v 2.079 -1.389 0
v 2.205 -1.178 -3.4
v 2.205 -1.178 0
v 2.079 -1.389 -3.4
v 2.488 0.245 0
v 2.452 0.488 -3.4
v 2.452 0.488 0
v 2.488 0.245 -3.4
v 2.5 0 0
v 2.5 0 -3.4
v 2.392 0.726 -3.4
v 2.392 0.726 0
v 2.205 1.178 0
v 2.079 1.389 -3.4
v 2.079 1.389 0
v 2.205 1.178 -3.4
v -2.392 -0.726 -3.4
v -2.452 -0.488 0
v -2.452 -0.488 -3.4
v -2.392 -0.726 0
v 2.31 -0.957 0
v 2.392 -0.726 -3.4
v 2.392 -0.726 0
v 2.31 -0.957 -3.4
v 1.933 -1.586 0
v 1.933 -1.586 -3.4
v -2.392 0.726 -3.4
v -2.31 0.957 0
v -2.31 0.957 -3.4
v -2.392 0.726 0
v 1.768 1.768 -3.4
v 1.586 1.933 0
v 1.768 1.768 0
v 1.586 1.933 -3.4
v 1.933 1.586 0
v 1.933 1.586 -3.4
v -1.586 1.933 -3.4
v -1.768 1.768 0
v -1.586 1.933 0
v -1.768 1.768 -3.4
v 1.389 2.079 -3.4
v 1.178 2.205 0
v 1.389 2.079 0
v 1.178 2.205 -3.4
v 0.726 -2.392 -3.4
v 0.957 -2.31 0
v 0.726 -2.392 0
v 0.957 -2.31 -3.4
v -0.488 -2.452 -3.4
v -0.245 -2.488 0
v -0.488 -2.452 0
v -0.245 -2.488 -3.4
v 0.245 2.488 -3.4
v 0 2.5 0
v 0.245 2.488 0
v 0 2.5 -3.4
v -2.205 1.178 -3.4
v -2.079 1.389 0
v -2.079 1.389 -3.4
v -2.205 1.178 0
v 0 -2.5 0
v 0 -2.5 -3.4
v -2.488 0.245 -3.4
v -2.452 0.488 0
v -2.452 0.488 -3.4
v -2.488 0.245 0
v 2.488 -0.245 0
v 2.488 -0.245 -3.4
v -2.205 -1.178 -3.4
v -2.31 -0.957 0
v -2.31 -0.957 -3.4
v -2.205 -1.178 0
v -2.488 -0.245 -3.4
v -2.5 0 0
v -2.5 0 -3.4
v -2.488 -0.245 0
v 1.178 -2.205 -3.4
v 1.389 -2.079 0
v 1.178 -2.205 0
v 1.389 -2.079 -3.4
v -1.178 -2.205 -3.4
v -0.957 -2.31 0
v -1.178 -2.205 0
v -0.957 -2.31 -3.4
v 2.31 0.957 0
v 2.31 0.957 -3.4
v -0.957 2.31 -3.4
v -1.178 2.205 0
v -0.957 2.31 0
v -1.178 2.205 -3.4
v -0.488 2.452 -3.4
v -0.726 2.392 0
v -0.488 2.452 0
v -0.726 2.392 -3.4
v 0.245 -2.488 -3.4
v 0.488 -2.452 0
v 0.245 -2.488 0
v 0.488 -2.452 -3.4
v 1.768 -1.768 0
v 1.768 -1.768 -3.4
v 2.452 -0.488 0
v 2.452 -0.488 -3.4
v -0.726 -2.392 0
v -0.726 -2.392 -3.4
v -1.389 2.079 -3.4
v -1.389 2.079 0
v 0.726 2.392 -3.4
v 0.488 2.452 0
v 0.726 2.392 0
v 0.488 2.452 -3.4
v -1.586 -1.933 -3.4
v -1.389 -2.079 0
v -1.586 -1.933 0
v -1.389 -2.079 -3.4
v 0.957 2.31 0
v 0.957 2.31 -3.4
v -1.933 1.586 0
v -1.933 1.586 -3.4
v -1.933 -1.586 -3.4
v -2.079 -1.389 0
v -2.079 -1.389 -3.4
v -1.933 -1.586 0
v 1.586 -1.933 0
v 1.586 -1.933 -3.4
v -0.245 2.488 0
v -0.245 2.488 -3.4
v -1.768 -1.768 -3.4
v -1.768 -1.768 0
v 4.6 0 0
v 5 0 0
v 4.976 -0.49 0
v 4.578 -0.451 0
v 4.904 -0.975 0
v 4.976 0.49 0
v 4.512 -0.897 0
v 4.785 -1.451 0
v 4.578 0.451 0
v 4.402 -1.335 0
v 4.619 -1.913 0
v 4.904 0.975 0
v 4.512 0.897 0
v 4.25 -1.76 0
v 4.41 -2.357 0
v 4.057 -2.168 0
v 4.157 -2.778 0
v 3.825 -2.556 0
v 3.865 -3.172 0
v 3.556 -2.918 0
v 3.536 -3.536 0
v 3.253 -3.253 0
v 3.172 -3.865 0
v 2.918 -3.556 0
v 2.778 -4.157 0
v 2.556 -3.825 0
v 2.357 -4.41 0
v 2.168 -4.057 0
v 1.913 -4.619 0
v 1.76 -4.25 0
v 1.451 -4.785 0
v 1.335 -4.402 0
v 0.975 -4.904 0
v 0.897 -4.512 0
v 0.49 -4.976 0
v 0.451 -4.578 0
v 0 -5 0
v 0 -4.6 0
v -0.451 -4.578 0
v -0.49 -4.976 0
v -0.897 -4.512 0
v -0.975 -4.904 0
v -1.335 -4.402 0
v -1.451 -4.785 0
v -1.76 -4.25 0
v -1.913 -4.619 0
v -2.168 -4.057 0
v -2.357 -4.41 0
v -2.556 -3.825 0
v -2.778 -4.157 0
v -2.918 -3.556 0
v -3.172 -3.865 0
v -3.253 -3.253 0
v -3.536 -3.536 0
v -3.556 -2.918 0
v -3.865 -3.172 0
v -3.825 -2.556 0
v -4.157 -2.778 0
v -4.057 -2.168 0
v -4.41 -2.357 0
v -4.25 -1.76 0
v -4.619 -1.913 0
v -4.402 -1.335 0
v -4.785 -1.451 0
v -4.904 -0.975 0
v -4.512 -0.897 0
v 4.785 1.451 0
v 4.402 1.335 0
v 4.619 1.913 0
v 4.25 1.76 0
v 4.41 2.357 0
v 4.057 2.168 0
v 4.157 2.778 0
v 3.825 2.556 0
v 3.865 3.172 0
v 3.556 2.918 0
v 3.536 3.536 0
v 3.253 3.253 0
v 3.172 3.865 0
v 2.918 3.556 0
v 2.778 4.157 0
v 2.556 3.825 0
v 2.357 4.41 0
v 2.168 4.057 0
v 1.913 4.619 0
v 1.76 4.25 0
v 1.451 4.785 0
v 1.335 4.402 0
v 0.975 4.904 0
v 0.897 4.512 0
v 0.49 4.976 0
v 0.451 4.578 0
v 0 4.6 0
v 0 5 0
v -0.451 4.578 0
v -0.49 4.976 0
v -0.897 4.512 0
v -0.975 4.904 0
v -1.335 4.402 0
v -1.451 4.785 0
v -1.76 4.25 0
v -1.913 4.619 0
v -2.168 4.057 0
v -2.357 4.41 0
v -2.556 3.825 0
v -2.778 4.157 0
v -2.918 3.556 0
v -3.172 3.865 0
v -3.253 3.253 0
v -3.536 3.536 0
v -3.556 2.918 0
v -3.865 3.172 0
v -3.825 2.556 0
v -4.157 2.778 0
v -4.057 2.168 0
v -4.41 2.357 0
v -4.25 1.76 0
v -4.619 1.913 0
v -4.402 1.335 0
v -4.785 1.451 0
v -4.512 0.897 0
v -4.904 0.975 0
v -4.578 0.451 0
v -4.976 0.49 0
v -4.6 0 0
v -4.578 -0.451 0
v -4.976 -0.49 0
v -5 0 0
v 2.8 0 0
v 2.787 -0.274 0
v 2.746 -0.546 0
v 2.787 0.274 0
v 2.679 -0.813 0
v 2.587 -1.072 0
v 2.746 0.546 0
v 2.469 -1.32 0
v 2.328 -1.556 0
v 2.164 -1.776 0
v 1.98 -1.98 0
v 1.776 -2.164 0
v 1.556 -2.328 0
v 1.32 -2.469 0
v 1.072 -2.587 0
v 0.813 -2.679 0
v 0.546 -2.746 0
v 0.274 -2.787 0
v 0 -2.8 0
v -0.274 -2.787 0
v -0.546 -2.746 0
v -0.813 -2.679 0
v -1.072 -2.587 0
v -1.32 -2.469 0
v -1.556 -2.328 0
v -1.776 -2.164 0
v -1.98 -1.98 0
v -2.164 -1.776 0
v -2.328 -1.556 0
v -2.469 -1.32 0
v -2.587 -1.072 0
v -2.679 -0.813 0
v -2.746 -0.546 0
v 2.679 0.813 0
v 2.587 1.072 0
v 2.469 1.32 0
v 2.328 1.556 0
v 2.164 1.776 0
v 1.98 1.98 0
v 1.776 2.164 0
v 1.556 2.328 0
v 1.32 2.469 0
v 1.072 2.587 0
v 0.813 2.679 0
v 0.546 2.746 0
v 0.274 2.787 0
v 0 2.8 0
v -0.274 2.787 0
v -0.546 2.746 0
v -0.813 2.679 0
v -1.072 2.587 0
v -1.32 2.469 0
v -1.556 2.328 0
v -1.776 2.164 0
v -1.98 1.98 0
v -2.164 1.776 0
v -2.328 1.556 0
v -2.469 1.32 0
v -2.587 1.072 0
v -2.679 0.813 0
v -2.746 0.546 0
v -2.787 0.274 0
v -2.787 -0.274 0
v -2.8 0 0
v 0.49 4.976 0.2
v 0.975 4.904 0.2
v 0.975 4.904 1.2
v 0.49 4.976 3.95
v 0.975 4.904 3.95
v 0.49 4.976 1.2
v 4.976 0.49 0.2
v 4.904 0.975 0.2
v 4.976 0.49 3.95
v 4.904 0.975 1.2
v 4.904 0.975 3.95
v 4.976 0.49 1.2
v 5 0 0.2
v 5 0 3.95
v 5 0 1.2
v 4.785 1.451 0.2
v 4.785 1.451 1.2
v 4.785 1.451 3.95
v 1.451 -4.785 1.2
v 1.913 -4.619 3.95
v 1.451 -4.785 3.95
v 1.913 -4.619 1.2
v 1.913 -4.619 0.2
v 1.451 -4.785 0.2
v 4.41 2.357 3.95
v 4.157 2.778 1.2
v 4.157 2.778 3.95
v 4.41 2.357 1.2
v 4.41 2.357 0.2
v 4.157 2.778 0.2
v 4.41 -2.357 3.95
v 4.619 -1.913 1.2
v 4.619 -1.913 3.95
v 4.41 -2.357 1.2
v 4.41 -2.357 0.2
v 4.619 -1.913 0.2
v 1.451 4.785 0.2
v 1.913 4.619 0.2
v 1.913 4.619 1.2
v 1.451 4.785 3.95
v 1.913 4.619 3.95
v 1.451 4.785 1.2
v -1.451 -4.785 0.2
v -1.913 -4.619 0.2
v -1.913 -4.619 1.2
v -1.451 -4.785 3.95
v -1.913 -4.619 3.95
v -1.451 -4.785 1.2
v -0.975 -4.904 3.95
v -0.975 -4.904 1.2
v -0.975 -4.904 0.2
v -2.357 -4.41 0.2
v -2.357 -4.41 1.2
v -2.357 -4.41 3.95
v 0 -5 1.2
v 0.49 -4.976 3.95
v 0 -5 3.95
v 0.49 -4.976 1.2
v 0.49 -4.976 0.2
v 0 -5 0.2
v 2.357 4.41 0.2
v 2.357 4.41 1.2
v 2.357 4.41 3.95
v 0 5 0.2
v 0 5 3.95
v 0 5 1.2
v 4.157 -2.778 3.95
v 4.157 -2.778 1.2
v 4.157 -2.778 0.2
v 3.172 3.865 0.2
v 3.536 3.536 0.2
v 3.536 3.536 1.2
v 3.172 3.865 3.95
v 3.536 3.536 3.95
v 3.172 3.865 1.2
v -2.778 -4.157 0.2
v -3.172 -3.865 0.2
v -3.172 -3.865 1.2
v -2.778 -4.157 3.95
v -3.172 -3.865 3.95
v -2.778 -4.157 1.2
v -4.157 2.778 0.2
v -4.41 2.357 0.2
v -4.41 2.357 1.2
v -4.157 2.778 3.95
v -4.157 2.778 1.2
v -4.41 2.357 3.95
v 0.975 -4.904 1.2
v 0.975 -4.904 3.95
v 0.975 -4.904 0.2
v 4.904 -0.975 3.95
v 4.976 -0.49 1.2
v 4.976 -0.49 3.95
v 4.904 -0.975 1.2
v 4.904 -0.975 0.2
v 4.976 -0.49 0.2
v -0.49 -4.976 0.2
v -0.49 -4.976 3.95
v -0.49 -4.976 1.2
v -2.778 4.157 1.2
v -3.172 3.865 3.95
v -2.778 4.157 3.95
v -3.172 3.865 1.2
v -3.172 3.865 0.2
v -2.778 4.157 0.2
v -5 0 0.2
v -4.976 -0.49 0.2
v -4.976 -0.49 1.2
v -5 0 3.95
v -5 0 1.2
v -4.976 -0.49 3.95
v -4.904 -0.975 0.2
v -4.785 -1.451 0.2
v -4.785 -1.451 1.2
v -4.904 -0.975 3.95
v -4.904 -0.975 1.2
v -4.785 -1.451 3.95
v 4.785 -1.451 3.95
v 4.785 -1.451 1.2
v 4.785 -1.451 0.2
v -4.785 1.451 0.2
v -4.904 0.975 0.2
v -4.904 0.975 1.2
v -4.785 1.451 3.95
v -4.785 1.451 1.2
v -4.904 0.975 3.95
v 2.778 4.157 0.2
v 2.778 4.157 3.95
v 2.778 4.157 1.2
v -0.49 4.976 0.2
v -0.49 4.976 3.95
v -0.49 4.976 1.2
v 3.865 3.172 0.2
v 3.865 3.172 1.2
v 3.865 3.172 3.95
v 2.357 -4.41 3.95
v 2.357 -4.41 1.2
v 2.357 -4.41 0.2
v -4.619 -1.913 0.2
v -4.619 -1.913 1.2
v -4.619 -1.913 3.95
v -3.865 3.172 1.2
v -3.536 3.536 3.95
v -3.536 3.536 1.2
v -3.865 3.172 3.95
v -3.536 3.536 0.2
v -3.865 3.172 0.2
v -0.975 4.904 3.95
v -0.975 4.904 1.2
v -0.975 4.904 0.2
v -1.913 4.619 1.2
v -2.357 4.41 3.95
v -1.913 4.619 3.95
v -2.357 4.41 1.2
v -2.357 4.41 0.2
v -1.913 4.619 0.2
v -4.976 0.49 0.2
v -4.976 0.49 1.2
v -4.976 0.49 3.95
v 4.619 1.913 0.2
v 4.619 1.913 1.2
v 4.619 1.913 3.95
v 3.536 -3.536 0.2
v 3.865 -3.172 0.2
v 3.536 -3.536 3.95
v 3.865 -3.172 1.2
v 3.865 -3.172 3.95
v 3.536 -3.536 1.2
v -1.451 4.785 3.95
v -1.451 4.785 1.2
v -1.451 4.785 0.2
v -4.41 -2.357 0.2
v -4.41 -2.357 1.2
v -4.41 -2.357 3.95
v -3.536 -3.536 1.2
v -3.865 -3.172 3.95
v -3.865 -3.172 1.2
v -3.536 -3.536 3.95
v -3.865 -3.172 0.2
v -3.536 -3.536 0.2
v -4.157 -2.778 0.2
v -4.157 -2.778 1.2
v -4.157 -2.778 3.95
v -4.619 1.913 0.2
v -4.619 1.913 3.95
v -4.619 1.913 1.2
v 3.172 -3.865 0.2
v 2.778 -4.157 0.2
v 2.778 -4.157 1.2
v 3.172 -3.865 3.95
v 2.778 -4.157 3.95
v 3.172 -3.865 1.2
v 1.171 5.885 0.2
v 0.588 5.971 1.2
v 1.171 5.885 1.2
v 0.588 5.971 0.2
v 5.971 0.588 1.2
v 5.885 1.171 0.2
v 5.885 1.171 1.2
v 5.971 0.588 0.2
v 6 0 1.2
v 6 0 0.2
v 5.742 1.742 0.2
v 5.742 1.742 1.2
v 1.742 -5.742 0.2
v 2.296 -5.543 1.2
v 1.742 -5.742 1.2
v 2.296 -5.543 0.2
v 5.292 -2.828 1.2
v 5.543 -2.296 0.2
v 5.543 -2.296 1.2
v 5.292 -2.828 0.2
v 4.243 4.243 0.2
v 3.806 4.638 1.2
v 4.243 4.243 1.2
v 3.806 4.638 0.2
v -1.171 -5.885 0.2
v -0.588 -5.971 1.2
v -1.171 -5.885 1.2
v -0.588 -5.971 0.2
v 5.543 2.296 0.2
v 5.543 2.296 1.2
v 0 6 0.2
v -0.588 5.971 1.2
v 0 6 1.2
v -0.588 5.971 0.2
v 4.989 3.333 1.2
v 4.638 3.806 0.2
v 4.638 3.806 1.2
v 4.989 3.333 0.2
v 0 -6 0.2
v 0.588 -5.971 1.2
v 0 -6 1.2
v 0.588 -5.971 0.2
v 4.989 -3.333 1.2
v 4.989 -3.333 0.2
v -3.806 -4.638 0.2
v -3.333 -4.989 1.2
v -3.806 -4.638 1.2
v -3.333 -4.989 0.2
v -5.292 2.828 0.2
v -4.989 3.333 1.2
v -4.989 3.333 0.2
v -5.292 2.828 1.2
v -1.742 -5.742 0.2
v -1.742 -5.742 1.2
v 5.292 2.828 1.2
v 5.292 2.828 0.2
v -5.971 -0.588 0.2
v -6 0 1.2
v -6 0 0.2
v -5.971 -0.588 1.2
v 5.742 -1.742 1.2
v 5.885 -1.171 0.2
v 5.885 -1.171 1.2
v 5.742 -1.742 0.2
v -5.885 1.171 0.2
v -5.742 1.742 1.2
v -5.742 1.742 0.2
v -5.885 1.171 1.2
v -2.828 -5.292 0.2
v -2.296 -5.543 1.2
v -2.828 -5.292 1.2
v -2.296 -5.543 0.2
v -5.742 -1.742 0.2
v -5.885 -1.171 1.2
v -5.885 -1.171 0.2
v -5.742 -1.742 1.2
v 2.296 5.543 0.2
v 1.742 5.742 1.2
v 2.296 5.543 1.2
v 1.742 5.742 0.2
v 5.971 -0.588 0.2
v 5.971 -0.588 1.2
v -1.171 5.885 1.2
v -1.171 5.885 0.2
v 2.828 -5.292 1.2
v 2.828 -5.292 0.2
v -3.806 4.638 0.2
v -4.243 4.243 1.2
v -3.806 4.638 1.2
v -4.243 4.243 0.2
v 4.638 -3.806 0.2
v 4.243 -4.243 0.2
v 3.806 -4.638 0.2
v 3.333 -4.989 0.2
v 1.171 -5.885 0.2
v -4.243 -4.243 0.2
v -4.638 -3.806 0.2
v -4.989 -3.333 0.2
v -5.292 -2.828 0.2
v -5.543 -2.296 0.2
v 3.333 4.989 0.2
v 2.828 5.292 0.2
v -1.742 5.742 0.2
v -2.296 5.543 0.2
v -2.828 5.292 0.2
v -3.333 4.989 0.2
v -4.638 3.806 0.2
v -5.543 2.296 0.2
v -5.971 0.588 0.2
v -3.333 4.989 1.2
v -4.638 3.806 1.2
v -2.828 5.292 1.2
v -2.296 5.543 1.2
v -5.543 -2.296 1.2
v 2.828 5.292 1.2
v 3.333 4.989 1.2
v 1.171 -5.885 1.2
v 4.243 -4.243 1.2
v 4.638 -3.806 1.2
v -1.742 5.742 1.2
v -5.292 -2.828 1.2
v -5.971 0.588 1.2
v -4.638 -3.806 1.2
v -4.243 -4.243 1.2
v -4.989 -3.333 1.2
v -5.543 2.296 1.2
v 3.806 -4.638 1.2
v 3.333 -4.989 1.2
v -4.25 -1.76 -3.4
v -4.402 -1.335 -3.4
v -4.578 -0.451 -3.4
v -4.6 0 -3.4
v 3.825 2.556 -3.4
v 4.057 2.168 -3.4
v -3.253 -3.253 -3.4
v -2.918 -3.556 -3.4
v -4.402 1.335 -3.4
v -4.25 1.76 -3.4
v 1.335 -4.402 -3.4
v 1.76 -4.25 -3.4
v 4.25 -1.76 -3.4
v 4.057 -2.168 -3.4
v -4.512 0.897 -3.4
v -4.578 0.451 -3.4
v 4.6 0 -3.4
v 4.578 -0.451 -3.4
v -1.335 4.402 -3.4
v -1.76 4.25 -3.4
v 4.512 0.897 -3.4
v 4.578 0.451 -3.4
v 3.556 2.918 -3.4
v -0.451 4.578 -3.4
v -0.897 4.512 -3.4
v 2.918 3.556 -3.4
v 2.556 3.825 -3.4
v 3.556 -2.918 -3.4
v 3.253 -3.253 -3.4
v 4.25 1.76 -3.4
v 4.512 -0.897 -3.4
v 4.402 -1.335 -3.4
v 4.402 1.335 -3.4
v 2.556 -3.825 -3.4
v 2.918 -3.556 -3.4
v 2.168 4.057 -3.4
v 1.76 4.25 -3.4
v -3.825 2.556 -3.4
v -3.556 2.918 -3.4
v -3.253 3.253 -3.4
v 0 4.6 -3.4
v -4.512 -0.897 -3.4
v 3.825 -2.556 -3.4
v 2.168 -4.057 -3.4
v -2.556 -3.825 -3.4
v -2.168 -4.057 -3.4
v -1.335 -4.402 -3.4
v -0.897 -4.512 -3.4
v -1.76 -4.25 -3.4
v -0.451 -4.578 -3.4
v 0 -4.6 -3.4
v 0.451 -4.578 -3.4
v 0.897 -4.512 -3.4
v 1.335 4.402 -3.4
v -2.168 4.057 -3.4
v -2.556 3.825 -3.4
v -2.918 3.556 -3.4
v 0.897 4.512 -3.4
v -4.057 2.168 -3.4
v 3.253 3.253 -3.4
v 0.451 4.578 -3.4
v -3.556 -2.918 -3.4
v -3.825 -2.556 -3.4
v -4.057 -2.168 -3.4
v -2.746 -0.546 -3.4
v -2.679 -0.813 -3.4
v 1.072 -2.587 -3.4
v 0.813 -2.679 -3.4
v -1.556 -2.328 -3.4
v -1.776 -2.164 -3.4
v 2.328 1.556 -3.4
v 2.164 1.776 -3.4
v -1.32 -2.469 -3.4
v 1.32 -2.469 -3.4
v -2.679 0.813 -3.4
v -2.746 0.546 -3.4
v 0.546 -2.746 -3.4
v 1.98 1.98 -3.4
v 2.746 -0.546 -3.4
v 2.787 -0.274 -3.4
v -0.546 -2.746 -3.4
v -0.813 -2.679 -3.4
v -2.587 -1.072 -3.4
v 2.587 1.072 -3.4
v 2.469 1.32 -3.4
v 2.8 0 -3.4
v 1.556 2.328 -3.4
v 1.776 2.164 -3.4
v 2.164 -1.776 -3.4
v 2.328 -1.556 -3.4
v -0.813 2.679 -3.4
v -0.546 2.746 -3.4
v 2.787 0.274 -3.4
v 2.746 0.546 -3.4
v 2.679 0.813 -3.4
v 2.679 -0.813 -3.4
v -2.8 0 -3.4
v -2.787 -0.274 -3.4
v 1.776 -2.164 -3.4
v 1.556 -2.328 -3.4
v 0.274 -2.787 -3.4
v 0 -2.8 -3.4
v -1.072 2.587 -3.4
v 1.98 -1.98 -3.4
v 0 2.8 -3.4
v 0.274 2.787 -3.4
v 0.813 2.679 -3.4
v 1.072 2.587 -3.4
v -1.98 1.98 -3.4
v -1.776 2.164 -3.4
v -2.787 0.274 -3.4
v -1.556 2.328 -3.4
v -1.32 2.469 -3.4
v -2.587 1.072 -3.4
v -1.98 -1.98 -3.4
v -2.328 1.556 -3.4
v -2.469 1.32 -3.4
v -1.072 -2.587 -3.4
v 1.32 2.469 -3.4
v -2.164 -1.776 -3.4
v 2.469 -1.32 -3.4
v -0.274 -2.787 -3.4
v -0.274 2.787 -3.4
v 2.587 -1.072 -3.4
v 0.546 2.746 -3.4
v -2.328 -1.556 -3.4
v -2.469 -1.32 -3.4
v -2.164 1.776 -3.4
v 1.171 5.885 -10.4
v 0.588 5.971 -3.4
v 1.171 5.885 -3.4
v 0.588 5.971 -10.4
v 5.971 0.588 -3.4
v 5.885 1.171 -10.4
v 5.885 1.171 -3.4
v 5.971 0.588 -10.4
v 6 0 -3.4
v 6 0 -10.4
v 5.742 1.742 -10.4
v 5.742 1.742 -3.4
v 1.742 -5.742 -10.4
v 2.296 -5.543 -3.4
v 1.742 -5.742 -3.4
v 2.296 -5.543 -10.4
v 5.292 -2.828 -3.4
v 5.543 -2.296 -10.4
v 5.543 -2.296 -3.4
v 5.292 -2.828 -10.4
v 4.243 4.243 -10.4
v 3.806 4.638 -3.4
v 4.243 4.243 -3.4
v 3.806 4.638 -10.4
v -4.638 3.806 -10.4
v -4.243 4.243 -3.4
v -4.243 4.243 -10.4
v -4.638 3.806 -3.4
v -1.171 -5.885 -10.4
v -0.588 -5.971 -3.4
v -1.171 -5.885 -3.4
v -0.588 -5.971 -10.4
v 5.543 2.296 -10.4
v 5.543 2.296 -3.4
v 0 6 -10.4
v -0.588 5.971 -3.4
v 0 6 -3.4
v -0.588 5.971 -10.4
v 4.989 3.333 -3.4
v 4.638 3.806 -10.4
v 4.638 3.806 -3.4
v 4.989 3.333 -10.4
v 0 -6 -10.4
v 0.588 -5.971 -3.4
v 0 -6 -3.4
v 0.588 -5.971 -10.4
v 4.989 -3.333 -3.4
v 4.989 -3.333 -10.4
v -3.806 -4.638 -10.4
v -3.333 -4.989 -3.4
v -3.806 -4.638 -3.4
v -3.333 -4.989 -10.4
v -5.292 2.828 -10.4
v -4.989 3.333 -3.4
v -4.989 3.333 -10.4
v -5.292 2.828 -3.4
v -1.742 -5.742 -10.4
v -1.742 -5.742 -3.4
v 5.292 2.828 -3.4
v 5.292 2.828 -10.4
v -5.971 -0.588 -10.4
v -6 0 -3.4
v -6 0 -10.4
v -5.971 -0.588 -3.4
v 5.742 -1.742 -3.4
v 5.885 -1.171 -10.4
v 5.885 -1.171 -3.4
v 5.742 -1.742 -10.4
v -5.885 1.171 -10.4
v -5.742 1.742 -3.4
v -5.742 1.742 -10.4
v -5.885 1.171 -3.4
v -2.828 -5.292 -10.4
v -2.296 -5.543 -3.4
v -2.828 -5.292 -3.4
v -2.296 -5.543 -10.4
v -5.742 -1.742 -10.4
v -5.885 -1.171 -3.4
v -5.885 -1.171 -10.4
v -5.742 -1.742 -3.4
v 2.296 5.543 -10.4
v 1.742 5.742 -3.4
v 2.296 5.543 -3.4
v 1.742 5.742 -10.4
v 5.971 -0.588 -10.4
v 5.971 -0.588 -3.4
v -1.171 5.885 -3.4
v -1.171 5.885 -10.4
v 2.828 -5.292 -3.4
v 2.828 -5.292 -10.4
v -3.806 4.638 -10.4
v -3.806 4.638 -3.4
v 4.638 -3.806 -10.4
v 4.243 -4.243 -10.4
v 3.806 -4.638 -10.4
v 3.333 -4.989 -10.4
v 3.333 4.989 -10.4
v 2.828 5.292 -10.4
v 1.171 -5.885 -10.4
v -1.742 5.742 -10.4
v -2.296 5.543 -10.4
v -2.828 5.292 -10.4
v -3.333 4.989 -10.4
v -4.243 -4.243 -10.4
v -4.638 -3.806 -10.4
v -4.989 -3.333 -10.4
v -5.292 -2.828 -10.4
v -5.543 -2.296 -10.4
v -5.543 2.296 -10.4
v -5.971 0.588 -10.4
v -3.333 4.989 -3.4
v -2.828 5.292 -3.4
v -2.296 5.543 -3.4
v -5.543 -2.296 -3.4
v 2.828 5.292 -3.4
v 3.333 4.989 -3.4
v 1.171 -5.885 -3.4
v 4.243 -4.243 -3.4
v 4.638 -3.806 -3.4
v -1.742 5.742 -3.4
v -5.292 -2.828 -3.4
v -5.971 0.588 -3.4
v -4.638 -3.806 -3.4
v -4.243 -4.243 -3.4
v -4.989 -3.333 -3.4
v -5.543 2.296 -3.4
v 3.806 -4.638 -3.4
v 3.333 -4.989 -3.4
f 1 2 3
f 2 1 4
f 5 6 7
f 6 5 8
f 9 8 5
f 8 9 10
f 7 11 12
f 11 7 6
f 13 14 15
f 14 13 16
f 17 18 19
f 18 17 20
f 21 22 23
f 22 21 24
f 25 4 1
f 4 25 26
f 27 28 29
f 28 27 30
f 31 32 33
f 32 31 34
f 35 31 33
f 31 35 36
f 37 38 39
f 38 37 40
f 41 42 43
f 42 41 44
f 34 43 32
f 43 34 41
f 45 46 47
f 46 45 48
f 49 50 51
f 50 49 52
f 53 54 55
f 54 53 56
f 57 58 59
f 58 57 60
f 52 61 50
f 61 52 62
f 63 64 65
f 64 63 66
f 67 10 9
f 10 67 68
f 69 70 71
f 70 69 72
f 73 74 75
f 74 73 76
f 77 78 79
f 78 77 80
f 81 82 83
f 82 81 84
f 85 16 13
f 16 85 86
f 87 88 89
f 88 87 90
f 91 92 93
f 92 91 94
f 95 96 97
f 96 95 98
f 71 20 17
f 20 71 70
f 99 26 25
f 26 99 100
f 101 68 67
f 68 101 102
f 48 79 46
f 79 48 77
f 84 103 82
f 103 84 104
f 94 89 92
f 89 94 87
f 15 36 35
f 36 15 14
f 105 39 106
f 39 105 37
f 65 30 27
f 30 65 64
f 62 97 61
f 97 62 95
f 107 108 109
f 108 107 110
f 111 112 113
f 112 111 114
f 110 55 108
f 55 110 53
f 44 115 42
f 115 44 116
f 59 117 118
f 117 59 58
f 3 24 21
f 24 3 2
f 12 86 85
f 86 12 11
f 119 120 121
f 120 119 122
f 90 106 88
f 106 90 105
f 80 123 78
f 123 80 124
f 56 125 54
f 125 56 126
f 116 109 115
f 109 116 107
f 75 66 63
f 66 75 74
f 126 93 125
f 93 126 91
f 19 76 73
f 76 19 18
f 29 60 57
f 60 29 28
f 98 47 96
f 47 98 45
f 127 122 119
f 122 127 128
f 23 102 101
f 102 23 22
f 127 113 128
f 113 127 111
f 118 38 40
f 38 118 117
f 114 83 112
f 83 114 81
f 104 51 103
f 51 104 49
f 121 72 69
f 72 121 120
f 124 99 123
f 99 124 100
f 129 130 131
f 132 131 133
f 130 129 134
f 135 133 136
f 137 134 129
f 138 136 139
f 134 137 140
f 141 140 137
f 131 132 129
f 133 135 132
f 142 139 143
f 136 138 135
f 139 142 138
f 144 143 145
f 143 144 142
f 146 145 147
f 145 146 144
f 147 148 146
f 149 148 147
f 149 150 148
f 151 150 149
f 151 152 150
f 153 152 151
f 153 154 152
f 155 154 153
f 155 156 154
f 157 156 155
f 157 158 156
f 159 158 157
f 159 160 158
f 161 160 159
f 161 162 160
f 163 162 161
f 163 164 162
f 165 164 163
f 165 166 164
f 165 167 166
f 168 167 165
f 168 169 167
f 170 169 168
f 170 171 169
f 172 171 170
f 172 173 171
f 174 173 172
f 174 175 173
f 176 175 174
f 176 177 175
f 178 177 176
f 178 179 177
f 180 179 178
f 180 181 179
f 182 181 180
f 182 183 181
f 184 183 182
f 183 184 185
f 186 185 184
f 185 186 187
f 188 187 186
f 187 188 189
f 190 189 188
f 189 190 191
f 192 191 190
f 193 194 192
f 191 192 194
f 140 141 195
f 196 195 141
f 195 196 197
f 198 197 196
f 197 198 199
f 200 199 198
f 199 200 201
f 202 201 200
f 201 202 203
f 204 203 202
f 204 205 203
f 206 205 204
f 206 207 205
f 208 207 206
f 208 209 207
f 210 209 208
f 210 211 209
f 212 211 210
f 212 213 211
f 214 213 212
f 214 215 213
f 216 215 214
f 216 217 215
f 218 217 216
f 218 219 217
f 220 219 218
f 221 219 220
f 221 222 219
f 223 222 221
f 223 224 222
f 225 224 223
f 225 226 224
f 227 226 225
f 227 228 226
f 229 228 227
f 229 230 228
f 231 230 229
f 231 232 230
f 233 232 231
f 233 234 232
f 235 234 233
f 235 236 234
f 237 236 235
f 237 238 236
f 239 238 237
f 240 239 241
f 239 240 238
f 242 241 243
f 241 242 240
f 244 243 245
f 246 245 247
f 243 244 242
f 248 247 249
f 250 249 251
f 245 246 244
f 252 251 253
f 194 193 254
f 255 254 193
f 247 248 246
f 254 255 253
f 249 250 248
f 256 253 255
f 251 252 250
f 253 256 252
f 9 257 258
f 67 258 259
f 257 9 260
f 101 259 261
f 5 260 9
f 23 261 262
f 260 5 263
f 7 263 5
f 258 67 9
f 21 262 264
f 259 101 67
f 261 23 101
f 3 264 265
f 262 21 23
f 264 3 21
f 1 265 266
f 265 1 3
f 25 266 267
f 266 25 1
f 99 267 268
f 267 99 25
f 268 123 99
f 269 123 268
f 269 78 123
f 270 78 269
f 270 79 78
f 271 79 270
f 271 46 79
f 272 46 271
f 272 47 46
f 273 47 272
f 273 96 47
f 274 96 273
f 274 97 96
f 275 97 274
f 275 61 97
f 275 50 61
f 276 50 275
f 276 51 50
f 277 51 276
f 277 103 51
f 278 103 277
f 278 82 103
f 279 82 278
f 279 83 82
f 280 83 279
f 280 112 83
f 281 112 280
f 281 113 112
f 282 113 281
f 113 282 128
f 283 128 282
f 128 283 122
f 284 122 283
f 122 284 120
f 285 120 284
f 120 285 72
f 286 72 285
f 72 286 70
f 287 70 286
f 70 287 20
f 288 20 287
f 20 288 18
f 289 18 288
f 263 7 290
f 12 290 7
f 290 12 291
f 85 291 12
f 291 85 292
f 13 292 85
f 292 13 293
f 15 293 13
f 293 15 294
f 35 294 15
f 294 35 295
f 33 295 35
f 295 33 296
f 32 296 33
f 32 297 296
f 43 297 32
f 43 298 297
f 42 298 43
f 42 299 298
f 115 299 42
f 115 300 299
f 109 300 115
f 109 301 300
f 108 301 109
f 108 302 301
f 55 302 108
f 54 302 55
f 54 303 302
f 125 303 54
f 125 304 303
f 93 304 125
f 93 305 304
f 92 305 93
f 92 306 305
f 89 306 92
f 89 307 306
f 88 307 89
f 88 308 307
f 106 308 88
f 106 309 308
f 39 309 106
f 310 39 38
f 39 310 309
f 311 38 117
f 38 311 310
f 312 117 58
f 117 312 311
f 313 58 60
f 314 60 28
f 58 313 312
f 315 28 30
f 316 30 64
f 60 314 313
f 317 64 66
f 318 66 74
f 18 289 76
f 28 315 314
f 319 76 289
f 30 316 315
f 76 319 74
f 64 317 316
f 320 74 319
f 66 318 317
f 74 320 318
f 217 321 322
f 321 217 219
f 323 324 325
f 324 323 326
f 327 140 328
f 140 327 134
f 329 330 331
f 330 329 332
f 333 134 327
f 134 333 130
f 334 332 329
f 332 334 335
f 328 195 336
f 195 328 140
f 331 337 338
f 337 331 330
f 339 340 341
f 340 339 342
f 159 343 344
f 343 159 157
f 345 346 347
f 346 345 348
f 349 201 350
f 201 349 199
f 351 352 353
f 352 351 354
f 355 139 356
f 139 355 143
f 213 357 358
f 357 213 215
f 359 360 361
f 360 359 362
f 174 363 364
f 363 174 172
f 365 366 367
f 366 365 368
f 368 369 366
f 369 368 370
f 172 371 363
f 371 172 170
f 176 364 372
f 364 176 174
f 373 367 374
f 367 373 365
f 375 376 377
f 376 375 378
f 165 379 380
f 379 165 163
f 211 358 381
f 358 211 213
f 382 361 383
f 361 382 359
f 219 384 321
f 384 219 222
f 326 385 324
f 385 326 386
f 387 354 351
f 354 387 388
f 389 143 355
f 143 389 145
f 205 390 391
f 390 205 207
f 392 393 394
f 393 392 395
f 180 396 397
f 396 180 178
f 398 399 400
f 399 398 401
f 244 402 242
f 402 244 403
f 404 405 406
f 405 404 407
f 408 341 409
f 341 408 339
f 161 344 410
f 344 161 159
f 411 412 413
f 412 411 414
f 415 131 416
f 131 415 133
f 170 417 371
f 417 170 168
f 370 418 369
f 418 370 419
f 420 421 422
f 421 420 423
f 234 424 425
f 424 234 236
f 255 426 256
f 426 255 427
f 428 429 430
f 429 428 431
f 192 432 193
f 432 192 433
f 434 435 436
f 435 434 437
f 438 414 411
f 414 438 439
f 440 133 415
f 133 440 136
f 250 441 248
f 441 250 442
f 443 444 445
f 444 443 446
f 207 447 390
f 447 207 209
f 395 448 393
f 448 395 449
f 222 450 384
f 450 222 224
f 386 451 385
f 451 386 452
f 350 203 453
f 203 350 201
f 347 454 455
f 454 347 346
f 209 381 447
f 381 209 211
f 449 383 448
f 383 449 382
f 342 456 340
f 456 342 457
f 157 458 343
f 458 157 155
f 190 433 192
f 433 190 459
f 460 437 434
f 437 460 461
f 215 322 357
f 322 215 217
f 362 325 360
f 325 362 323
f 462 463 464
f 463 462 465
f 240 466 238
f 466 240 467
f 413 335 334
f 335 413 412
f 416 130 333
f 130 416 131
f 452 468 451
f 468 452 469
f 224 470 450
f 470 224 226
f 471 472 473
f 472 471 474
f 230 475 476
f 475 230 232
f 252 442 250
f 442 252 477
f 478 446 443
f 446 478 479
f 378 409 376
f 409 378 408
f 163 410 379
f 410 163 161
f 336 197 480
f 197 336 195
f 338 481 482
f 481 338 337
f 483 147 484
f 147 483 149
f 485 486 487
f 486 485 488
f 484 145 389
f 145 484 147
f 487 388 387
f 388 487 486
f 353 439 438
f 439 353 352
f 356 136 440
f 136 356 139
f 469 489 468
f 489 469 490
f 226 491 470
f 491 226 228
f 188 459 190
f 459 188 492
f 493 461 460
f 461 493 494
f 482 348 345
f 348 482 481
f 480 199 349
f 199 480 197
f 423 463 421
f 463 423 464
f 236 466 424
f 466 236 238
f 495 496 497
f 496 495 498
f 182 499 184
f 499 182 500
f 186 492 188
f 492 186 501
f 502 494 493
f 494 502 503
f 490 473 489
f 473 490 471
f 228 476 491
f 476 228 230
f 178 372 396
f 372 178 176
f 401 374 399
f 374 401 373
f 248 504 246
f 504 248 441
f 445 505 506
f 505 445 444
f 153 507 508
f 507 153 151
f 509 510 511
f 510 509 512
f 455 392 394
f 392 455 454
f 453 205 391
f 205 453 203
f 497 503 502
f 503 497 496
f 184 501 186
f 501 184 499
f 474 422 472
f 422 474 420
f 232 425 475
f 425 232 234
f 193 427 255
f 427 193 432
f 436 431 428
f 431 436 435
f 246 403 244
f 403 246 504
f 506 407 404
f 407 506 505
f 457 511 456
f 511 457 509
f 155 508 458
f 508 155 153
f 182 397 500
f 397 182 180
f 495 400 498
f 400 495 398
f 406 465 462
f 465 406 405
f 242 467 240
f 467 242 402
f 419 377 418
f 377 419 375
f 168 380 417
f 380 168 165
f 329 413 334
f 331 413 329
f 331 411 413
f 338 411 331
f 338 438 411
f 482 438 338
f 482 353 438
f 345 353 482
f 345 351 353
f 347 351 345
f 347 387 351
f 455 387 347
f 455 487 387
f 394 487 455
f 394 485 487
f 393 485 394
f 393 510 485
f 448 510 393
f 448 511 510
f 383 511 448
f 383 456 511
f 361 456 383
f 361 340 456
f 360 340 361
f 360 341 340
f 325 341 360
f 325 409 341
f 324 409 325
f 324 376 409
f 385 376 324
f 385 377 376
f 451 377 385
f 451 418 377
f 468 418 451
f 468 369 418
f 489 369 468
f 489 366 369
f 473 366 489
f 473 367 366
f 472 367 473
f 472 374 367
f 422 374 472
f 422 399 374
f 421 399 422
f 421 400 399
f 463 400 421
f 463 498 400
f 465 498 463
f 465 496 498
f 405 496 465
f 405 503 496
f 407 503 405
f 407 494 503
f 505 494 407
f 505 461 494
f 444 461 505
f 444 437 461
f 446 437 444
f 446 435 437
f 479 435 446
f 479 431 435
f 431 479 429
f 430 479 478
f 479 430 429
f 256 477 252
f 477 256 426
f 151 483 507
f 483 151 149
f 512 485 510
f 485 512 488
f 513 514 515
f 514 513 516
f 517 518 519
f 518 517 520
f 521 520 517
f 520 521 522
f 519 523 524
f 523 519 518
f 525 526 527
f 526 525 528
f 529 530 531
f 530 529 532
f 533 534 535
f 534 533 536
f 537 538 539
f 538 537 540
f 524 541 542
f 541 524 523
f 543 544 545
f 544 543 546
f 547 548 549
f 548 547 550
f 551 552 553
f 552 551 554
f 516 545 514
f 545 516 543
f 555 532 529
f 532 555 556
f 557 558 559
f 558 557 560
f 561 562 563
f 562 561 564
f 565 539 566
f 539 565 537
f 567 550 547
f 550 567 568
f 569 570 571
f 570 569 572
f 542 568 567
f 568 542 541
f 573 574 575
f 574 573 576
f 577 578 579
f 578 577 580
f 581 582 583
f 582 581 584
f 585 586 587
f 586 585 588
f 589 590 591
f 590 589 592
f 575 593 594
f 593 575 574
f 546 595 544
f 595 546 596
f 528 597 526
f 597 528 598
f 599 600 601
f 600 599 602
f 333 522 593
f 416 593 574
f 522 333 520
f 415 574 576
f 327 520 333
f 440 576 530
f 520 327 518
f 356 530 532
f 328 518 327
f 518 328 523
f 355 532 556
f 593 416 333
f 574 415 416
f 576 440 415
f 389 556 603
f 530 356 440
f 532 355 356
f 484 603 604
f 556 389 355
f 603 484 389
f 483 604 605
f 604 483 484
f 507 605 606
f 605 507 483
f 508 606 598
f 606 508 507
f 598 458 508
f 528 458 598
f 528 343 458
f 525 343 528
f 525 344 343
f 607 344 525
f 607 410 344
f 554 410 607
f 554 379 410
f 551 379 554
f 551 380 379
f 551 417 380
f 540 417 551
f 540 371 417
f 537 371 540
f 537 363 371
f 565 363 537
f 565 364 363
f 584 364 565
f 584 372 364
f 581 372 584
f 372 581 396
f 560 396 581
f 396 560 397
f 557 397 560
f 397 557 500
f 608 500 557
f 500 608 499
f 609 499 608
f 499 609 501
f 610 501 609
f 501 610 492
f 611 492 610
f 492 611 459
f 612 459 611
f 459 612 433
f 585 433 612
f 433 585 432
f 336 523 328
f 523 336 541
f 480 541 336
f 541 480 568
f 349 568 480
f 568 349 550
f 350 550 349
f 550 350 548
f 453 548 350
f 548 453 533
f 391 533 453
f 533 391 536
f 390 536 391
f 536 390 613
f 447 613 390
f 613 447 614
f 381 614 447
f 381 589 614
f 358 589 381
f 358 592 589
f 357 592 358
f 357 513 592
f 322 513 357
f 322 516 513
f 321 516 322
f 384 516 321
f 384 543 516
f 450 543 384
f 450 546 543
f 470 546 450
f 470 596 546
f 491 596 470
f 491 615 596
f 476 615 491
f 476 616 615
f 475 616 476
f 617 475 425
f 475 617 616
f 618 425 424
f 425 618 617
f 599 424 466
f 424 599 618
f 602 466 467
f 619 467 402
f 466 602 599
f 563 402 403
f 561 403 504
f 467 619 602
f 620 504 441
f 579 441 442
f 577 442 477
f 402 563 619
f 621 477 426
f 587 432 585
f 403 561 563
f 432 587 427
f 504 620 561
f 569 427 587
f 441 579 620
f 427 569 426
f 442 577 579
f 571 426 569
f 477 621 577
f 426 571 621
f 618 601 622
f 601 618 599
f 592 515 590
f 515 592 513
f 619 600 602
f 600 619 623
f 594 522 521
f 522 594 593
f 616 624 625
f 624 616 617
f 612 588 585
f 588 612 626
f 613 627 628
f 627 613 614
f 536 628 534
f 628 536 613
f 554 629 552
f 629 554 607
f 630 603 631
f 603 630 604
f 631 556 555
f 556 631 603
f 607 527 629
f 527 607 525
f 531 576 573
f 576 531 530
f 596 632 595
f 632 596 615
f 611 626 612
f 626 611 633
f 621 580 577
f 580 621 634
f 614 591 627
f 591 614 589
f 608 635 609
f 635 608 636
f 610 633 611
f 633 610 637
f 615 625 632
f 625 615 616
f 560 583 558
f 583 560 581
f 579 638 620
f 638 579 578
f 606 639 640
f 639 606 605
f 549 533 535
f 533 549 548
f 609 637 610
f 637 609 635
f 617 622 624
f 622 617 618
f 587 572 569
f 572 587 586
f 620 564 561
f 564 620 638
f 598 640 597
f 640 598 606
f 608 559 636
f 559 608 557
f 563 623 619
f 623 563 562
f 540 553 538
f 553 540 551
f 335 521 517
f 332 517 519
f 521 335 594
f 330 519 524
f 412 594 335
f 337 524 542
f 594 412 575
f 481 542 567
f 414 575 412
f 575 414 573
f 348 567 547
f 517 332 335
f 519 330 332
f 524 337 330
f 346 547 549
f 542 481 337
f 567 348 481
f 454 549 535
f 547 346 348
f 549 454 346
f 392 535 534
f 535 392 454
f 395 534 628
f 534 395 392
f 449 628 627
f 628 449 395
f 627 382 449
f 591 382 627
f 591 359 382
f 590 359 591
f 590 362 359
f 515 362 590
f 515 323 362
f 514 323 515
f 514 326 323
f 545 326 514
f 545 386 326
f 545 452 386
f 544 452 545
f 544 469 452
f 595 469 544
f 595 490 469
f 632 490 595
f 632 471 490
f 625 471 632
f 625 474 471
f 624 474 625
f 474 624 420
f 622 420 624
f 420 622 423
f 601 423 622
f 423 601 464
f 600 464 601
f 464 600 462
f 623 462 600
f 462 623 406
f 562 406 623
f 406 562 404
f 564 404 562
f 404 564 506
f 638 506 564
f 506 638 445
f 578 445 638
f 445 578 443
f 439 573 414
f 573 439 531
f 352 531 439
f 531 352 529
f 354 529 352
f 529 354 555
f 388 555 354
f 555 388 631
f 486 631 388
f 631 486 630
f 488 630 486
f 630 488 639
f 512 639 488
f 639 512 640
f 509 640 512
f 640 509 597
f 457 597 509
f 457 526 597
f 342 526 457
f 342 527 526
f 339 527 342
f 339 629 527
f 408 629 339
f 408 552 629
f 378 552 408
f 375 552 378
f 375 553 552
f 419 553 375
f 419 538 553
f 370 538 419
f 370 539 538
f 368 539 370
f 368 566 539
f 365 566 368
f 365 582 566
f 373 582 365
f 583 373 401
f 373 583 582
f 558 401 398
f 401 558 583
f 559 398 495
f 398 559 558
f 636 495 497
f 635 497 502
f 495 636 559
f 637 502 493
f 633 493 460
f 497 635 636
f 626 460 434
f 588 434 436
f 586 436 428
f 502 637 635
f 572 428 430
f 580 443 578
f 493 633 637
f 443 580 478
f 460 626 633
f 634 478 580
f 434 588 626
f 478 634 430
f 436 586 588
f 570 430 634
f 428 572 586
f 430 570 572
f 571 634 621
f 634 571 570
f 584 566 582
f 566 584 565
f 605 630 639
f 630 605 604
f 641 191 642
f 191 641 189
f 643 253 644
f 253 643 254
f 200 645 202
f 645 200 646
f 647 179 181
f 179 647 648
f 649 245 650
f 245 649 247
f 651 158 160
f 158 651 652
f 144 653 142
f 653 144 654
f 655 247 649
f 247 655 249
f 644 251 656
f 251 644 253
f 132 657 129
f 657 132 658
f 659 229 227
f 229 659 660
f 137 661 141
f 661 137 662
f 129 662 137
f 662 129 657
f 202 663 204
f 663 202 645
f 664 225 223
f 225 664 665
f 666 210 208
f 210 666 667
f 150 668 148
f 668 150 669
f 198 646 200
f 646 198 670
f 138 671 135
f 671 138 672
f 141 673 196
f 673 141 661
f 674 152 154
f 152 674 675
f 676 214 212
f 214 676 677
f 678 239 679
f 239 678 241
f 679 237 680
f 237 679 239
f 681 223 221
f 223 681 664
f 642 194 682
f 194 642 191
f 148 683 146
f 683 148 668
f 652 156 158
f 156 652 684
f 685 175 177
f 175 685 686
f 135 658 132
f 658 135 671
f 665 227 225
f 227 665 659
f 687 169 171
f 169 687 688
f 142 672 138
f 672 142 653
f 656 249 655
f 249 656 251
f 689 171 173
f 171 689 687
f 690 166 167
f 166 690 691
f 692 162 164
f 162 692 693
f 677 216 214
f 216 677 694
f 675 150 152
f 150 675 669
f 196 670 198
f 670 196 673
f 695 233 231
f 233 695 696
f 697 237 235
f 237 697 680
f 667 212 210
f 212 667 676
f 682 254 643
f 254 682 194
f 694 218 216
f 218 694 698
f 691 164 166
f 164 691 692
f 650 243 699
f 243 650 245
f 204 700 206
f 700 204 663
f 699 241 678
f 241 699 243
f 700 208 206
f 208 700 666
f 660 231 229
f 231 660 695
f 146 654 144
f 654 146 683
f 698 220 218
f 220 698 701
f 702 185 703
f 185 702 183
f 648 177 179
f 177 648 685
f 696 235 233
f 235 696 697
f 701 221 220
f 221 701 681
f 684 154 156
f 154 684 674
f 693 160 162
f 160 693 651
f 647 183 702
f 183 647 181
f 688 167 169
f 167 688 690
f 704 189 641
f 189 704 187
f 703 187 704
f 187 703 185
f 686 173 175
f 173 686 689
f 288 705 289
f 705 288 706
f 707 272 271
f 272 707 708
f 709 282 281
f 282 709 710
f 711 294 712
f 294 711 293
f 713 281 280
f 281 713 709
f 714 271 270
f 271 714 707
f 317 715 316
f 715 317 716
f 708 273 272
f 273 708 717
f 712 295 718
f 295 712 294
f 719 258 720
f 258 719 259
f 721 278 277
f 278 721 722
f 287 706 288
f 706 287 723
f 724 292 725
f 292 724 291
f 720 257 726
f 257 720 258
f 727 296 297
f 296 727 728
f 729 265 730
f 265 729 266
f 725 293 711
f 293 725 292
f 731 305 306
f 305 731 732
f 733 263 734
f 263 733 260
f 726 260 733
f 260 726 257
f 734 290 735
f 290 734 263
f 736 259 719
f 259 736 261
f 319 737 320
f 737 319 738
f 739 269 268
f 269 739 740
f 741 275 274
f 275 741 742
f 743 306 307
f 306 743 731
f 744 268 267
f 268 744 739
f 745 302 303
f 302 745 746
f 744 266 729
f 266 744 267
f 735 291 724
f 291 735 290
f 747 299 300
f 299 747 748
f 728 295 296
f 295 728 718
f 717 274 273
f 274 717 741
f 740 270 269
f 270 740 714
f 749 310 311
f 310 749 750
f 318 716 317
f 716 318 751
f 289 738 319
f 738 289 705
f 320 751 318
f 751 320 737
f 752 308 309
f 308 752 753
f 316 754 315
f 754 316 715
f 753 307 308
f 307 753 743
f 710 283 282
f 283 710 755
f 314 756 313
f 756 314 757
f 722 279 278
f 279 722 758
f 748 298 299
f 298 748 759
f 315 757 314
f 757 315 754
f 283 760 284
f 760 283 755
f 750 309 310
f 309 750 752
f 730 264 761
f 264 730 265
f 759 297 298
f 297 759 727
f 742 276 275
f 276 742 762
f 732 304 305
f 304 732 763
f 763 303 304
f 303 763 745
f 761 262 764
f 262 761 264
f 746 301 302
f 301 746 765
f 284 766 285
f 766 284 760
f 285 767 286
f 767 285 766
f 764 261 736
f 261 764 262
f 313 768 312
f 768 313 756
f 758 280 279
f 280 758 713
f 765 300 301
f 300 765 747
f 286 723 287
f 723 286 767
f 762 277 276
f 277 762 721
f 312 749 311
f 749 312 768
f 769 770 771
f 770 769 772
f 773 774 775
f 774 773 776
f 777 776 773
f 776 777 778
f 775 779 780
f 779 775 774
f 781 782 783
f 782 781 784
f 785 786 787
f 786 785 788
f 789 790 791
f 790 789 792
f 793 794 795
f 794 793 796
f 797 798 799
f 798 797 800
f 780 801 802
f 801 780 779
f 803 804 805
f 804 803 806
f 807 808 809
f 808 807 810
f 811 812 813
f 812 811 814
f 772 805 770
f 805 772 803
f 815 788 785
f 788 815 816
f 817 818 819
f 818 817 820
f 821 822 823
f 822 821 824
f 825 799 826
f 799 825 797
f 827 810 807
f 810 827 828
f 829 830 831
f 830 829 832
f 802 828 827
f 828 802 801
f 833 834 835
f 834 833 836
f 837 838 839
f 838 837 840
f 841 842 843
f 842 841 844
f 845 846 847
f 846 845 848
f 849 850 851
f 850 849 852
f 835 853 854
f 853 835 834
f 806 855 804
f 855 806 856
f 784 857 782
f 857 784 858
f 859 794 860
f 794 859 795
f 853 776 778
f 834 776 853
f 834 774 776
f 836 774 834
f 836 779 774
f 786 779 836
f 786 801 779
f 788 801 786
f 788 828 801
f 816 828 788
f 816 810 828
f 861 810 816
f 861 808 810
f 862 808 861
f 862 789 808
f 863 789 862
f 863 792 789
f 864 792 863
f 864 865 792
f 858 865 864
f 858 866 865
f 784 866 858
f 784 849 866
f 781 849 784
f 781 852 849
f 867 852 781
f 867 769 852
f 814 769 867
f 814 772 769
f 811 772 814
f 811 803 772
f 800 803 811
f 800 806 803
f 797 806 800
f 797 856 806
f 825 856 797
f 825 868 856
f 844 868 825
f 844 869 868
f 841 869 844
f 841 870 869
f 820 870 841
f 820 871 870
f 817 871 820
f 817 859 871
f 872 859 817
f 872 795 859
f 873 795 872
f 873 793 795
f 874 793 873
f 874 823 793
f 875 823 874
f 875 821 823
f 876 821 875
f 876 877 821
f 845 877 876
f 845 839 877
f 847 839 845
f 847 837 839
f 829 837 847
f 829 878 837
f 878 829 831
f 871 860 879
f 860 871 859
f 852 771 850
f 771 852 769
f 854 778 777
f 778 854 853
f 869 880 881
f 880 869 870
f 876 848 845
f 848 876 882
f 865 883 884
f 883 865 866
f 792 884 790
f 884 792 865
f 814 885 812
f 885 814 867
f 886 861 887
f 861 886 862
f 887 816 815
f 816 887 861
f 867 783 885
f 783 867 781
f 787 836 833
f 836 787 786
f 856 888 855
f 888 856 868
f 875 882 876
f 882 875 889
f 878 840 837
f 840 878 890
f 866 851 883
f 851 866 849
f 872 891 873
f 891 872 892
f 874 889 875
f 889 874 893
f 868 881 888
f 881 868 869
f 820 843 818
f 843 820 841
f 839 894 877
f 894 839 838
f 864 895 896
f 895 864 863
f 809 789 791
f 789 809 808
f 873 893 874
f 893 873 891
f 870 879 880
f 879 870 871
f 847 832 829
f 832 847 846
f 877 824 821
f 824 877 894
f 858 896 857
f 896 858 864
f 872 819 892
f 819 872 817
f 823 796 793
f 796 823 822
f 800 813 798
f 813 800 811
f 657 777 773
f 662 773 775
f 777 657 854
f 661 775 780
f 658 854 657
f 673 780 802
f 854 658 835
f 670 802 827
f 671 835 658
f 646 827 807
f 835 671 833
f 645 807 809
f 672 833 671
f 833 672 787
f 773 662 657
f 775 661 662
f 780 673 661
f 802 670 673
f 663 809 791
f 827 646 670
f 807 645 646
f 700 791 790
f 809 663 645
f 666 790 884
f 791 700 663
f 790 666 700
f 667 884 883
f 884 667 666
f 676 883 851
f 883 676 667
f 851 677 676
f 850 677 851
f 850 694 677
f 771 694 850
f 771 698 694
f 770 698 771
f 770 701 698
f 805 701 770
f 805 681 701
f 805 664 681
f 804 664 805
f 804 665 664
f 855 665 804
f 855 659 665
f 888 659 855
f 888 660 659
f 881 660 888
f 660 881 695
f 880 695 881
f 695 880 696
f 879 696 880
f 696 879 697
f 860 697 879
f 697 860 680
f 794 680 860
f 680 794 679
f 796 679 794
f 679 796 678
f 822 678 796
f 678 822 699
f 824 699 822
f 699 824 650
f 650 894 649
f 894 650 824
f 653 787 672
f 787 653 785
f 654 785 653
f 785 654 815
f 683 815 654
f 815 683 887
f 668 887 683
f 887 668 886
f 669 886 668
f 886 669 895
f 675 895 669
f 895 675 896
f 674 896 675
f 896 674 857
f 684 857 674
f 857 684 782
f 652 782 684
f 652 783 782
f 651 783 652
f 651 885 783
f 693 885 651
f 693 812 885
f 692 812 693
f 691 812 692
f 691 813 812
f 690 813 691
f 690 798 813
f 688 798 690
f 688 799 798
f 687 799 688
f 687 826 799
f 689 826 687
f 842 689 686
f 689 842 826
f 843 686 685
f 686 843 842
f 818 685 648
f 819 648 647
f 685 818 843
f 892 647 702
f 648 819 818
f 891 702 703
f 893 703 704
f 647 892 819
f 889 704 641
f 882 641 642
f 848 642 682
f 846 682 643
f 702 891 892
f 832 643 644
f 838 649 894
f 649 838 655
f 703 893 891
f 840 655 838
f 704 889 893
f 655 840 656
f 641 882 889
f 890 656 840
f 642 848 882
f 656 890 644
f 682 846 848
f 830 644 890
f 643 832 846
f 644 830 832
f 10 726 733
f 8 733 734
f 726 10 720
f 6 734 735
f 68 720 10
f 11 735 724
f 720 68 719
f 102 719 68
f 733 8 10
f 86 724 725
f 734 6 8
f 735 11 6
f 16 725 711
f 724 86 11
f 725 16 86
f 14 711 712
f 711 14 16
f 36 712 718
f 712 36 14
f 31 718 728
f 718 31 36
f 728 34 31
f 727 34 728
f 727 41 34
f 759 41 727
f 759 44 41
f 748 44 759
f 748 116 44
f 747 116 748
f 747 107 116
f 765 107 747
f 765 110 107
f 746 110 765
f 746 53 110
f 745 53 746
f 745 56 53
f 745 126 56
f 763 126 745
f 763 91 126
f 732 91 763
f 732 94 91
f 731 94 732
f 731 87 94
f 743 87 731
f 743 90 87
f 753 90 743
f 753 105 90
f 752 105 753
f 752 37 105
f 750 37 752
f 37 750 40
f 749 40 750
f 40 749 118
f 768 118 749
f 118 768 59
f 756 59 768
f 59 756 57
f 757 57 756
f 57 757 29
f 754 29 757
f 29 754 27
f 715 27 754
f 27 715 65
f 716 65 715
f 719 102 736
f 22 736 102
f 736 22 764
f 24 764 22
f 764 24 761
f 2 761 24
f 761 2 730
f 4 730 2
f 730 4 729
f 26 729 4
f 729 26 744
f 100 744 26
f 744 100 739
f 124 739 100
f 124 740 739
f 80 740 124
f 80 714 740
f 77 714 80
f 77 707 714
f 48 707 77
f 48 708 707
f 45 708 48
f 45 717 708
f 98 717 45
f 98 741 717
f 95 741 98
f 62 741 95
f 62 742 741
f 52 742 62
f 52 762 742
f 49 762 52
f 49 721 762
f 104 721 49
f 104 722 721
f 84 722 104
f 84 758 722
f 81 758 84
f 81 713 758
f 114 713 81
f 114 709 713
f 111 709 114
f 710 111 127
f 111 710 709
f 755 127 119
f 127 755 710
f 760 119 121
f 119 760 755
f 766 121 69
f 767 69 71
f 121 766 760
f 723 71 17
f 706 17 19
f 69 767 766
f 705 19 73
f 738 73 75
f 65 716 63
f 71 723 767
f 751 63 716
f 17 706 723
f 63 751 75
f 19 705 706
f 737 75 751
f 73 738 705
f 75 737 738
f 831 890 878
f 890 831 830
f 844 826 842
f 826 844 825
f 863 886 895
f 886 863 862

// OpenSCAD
// Parameters
shaft_diameter = 5; //[2.5:10:0.1]
length_under_head = 10; //[5:20:0.1]
head_diameter = 10; //[5:20:0.1]
head_height = 3.95; //[2:8:0.05]
thread_depth = 0.35; //[0.15:0.8:0.05]
thread_pitch = 0.8; //[0.4:1.6:0.05]
thread_turns = 13; //[5:30:1]
drive_socket_radius = 3; //[1.5:5:0.1]
drive_socket_depth = 2; //[1:3.5:0.1]
drive_slot_width = 1; //[0.6:2:0.05]
washer_outer_diameter = 12; //[8:24:0.1]
washer_thickness = 1; //[0.5:3:0.1]
washer_hole_diameter = 5.5; //[5.1:7:0.1]
spacer_height = 6; //[3:15:0.1]
spacer_wall = 1.8; //[1:3.6:0.1]
spacer_clearance_diameter = 5.6; //[5.1:7:0.1]
buzzer_diameter = 12; //[8:24:0.1]
buzzer_height = 7; //[4:14:0.1]

// Use 1–2mm overlap to guarantee watertight connections
overlap = 1.2; //[0.3:2:0.1]

// --------------------
// Derived Z references
// --------------------
// Place the underside of the screw head at Z=0.
// Shaft extends downward (negative Z). Washer/spacer/buzzer stack below.
z_head_underside = 0;
z_head_top       = z_head_underside + head_height;
z_shaft_bottom   = z_head_underside - length_under_head;

// Washer sits directly under head with overlap into head/shaft
z_washer_top     = z_head_underside + overlap;
z_washer_bottom  = z_washer_top - washer_thickness;

// Spacer sits under washer with overlap
z_spacer_top     = z_washer_bottom + overlap;
z_spacer_bottom  = z_spacer_top - spacer_height;

// Buzzer sits under spacer with overlap (fixes floating black cylinder + gap)
z_buzzer_top     = z_spacer_bottom + overlap;
z_buzzer_bottom  = z_buzzer_top - buzzer_height;

// --------------------
// Screw (missing part) + washer
// --------------------
module screw_and_washer() {
  union() {
    // Screw body (shaft + head) as one solid
    color("DimGray")
    union() {
      // Shaft
      translate([0, 0, (z_head_underside + z_shaft_bottom)/2])
        cylinder(h=length_under_head, r=shaft_diameter/2, center=true, $fn=64);

      // Pan head
      translate([0, 0, (z_head_underside + z_head_top)/2])
        cylinder(h=head_height, r=head_diameter/2, center=true, $fn=64);
    }

    // Drive recess: subtract from head (kept as a recess, not a separate floating part)
    difference() {
      // Head again as subtraction target (only affects head volume)
      translate([0, 0, (z_head_underside + z_head_top)/2])
        cylinder(h=head_height, r=head_diameter/2, center=true, $fn=64);

      // Recess pocket
      translate([0, 0, z_head_top - drive_socket_depth/2])
        cylinder(h=drive_socket_depth + 0.2, r=drive_socket_radius, center=true, $fn=64);

      // Cross slot inside the pocket
      translate([0, 0, z_head_top - drive_socket_depth/2])
        union() {
          cube([2*drive_socket_radius, drive_slot_width, drive_socket_depth + 0.4], center=true);
          cube([drive_slot_width, 2*drive_socket_radius, drive_socket_depth + 0.4], center=true);
        }
    }

    // Washer (physically overlaps into head/shaft by 'overlap')
    color("DimGray")
    translate([0, 0, (z_washer_top + z_washer_bottom)/2])
      difference() {
        cylinder(h=washer_thickness, r=washer_outer_diameter/2, center=true, $fn=64);
        cylinder(h=washer_thickness + 2*overlap, r=washer_hole_diameter/2, center=true, $fn=64);
      }
  }
}

// --------------------
// PCB Spacer
// --------------------
module pcb_spacer() {
  color("Silver")
  translate([0, 0, (z_spacer_top + z_spacer_bottom)/2])
    difference() {
      cylinder(h=spacer_height, r=spacer_clearance_diameter/2 + spacer_wall, center=true, $fn=64);
      cylinder(h=spacer_height + 2*overlap, r=spacer_clearance_diameter/2, center=true, $fn=64);
    }
}

// --------------------
// Buzzer (black cylinder) - attached with overlap (no floating/gap)
// --------------------
module buzzer() {
  color("Black")
  translate([0, 0, (z_buzzer_top + z_buzzer_bottom)/2])
    cylinder(h=buzzer_height, r=buzzer_diameter/2, center=true, $fn=64);
}

// --------------------
// Assembly: single connected solid
// --------------------
module assembly() {
  union() {
    // Make the screw a single solid with its recess by subtracting recess from head
    // while keeping washer/spacer/buzzer unioned and overlapping.
    union() {
      // Screw+washer (includes head/shaft and washer)
      screw_and_washer();

      // Spacer and buzzer attached below with overlaps
      pcb_spacer();
      buzzer();
    }
  }
}

assembly();
